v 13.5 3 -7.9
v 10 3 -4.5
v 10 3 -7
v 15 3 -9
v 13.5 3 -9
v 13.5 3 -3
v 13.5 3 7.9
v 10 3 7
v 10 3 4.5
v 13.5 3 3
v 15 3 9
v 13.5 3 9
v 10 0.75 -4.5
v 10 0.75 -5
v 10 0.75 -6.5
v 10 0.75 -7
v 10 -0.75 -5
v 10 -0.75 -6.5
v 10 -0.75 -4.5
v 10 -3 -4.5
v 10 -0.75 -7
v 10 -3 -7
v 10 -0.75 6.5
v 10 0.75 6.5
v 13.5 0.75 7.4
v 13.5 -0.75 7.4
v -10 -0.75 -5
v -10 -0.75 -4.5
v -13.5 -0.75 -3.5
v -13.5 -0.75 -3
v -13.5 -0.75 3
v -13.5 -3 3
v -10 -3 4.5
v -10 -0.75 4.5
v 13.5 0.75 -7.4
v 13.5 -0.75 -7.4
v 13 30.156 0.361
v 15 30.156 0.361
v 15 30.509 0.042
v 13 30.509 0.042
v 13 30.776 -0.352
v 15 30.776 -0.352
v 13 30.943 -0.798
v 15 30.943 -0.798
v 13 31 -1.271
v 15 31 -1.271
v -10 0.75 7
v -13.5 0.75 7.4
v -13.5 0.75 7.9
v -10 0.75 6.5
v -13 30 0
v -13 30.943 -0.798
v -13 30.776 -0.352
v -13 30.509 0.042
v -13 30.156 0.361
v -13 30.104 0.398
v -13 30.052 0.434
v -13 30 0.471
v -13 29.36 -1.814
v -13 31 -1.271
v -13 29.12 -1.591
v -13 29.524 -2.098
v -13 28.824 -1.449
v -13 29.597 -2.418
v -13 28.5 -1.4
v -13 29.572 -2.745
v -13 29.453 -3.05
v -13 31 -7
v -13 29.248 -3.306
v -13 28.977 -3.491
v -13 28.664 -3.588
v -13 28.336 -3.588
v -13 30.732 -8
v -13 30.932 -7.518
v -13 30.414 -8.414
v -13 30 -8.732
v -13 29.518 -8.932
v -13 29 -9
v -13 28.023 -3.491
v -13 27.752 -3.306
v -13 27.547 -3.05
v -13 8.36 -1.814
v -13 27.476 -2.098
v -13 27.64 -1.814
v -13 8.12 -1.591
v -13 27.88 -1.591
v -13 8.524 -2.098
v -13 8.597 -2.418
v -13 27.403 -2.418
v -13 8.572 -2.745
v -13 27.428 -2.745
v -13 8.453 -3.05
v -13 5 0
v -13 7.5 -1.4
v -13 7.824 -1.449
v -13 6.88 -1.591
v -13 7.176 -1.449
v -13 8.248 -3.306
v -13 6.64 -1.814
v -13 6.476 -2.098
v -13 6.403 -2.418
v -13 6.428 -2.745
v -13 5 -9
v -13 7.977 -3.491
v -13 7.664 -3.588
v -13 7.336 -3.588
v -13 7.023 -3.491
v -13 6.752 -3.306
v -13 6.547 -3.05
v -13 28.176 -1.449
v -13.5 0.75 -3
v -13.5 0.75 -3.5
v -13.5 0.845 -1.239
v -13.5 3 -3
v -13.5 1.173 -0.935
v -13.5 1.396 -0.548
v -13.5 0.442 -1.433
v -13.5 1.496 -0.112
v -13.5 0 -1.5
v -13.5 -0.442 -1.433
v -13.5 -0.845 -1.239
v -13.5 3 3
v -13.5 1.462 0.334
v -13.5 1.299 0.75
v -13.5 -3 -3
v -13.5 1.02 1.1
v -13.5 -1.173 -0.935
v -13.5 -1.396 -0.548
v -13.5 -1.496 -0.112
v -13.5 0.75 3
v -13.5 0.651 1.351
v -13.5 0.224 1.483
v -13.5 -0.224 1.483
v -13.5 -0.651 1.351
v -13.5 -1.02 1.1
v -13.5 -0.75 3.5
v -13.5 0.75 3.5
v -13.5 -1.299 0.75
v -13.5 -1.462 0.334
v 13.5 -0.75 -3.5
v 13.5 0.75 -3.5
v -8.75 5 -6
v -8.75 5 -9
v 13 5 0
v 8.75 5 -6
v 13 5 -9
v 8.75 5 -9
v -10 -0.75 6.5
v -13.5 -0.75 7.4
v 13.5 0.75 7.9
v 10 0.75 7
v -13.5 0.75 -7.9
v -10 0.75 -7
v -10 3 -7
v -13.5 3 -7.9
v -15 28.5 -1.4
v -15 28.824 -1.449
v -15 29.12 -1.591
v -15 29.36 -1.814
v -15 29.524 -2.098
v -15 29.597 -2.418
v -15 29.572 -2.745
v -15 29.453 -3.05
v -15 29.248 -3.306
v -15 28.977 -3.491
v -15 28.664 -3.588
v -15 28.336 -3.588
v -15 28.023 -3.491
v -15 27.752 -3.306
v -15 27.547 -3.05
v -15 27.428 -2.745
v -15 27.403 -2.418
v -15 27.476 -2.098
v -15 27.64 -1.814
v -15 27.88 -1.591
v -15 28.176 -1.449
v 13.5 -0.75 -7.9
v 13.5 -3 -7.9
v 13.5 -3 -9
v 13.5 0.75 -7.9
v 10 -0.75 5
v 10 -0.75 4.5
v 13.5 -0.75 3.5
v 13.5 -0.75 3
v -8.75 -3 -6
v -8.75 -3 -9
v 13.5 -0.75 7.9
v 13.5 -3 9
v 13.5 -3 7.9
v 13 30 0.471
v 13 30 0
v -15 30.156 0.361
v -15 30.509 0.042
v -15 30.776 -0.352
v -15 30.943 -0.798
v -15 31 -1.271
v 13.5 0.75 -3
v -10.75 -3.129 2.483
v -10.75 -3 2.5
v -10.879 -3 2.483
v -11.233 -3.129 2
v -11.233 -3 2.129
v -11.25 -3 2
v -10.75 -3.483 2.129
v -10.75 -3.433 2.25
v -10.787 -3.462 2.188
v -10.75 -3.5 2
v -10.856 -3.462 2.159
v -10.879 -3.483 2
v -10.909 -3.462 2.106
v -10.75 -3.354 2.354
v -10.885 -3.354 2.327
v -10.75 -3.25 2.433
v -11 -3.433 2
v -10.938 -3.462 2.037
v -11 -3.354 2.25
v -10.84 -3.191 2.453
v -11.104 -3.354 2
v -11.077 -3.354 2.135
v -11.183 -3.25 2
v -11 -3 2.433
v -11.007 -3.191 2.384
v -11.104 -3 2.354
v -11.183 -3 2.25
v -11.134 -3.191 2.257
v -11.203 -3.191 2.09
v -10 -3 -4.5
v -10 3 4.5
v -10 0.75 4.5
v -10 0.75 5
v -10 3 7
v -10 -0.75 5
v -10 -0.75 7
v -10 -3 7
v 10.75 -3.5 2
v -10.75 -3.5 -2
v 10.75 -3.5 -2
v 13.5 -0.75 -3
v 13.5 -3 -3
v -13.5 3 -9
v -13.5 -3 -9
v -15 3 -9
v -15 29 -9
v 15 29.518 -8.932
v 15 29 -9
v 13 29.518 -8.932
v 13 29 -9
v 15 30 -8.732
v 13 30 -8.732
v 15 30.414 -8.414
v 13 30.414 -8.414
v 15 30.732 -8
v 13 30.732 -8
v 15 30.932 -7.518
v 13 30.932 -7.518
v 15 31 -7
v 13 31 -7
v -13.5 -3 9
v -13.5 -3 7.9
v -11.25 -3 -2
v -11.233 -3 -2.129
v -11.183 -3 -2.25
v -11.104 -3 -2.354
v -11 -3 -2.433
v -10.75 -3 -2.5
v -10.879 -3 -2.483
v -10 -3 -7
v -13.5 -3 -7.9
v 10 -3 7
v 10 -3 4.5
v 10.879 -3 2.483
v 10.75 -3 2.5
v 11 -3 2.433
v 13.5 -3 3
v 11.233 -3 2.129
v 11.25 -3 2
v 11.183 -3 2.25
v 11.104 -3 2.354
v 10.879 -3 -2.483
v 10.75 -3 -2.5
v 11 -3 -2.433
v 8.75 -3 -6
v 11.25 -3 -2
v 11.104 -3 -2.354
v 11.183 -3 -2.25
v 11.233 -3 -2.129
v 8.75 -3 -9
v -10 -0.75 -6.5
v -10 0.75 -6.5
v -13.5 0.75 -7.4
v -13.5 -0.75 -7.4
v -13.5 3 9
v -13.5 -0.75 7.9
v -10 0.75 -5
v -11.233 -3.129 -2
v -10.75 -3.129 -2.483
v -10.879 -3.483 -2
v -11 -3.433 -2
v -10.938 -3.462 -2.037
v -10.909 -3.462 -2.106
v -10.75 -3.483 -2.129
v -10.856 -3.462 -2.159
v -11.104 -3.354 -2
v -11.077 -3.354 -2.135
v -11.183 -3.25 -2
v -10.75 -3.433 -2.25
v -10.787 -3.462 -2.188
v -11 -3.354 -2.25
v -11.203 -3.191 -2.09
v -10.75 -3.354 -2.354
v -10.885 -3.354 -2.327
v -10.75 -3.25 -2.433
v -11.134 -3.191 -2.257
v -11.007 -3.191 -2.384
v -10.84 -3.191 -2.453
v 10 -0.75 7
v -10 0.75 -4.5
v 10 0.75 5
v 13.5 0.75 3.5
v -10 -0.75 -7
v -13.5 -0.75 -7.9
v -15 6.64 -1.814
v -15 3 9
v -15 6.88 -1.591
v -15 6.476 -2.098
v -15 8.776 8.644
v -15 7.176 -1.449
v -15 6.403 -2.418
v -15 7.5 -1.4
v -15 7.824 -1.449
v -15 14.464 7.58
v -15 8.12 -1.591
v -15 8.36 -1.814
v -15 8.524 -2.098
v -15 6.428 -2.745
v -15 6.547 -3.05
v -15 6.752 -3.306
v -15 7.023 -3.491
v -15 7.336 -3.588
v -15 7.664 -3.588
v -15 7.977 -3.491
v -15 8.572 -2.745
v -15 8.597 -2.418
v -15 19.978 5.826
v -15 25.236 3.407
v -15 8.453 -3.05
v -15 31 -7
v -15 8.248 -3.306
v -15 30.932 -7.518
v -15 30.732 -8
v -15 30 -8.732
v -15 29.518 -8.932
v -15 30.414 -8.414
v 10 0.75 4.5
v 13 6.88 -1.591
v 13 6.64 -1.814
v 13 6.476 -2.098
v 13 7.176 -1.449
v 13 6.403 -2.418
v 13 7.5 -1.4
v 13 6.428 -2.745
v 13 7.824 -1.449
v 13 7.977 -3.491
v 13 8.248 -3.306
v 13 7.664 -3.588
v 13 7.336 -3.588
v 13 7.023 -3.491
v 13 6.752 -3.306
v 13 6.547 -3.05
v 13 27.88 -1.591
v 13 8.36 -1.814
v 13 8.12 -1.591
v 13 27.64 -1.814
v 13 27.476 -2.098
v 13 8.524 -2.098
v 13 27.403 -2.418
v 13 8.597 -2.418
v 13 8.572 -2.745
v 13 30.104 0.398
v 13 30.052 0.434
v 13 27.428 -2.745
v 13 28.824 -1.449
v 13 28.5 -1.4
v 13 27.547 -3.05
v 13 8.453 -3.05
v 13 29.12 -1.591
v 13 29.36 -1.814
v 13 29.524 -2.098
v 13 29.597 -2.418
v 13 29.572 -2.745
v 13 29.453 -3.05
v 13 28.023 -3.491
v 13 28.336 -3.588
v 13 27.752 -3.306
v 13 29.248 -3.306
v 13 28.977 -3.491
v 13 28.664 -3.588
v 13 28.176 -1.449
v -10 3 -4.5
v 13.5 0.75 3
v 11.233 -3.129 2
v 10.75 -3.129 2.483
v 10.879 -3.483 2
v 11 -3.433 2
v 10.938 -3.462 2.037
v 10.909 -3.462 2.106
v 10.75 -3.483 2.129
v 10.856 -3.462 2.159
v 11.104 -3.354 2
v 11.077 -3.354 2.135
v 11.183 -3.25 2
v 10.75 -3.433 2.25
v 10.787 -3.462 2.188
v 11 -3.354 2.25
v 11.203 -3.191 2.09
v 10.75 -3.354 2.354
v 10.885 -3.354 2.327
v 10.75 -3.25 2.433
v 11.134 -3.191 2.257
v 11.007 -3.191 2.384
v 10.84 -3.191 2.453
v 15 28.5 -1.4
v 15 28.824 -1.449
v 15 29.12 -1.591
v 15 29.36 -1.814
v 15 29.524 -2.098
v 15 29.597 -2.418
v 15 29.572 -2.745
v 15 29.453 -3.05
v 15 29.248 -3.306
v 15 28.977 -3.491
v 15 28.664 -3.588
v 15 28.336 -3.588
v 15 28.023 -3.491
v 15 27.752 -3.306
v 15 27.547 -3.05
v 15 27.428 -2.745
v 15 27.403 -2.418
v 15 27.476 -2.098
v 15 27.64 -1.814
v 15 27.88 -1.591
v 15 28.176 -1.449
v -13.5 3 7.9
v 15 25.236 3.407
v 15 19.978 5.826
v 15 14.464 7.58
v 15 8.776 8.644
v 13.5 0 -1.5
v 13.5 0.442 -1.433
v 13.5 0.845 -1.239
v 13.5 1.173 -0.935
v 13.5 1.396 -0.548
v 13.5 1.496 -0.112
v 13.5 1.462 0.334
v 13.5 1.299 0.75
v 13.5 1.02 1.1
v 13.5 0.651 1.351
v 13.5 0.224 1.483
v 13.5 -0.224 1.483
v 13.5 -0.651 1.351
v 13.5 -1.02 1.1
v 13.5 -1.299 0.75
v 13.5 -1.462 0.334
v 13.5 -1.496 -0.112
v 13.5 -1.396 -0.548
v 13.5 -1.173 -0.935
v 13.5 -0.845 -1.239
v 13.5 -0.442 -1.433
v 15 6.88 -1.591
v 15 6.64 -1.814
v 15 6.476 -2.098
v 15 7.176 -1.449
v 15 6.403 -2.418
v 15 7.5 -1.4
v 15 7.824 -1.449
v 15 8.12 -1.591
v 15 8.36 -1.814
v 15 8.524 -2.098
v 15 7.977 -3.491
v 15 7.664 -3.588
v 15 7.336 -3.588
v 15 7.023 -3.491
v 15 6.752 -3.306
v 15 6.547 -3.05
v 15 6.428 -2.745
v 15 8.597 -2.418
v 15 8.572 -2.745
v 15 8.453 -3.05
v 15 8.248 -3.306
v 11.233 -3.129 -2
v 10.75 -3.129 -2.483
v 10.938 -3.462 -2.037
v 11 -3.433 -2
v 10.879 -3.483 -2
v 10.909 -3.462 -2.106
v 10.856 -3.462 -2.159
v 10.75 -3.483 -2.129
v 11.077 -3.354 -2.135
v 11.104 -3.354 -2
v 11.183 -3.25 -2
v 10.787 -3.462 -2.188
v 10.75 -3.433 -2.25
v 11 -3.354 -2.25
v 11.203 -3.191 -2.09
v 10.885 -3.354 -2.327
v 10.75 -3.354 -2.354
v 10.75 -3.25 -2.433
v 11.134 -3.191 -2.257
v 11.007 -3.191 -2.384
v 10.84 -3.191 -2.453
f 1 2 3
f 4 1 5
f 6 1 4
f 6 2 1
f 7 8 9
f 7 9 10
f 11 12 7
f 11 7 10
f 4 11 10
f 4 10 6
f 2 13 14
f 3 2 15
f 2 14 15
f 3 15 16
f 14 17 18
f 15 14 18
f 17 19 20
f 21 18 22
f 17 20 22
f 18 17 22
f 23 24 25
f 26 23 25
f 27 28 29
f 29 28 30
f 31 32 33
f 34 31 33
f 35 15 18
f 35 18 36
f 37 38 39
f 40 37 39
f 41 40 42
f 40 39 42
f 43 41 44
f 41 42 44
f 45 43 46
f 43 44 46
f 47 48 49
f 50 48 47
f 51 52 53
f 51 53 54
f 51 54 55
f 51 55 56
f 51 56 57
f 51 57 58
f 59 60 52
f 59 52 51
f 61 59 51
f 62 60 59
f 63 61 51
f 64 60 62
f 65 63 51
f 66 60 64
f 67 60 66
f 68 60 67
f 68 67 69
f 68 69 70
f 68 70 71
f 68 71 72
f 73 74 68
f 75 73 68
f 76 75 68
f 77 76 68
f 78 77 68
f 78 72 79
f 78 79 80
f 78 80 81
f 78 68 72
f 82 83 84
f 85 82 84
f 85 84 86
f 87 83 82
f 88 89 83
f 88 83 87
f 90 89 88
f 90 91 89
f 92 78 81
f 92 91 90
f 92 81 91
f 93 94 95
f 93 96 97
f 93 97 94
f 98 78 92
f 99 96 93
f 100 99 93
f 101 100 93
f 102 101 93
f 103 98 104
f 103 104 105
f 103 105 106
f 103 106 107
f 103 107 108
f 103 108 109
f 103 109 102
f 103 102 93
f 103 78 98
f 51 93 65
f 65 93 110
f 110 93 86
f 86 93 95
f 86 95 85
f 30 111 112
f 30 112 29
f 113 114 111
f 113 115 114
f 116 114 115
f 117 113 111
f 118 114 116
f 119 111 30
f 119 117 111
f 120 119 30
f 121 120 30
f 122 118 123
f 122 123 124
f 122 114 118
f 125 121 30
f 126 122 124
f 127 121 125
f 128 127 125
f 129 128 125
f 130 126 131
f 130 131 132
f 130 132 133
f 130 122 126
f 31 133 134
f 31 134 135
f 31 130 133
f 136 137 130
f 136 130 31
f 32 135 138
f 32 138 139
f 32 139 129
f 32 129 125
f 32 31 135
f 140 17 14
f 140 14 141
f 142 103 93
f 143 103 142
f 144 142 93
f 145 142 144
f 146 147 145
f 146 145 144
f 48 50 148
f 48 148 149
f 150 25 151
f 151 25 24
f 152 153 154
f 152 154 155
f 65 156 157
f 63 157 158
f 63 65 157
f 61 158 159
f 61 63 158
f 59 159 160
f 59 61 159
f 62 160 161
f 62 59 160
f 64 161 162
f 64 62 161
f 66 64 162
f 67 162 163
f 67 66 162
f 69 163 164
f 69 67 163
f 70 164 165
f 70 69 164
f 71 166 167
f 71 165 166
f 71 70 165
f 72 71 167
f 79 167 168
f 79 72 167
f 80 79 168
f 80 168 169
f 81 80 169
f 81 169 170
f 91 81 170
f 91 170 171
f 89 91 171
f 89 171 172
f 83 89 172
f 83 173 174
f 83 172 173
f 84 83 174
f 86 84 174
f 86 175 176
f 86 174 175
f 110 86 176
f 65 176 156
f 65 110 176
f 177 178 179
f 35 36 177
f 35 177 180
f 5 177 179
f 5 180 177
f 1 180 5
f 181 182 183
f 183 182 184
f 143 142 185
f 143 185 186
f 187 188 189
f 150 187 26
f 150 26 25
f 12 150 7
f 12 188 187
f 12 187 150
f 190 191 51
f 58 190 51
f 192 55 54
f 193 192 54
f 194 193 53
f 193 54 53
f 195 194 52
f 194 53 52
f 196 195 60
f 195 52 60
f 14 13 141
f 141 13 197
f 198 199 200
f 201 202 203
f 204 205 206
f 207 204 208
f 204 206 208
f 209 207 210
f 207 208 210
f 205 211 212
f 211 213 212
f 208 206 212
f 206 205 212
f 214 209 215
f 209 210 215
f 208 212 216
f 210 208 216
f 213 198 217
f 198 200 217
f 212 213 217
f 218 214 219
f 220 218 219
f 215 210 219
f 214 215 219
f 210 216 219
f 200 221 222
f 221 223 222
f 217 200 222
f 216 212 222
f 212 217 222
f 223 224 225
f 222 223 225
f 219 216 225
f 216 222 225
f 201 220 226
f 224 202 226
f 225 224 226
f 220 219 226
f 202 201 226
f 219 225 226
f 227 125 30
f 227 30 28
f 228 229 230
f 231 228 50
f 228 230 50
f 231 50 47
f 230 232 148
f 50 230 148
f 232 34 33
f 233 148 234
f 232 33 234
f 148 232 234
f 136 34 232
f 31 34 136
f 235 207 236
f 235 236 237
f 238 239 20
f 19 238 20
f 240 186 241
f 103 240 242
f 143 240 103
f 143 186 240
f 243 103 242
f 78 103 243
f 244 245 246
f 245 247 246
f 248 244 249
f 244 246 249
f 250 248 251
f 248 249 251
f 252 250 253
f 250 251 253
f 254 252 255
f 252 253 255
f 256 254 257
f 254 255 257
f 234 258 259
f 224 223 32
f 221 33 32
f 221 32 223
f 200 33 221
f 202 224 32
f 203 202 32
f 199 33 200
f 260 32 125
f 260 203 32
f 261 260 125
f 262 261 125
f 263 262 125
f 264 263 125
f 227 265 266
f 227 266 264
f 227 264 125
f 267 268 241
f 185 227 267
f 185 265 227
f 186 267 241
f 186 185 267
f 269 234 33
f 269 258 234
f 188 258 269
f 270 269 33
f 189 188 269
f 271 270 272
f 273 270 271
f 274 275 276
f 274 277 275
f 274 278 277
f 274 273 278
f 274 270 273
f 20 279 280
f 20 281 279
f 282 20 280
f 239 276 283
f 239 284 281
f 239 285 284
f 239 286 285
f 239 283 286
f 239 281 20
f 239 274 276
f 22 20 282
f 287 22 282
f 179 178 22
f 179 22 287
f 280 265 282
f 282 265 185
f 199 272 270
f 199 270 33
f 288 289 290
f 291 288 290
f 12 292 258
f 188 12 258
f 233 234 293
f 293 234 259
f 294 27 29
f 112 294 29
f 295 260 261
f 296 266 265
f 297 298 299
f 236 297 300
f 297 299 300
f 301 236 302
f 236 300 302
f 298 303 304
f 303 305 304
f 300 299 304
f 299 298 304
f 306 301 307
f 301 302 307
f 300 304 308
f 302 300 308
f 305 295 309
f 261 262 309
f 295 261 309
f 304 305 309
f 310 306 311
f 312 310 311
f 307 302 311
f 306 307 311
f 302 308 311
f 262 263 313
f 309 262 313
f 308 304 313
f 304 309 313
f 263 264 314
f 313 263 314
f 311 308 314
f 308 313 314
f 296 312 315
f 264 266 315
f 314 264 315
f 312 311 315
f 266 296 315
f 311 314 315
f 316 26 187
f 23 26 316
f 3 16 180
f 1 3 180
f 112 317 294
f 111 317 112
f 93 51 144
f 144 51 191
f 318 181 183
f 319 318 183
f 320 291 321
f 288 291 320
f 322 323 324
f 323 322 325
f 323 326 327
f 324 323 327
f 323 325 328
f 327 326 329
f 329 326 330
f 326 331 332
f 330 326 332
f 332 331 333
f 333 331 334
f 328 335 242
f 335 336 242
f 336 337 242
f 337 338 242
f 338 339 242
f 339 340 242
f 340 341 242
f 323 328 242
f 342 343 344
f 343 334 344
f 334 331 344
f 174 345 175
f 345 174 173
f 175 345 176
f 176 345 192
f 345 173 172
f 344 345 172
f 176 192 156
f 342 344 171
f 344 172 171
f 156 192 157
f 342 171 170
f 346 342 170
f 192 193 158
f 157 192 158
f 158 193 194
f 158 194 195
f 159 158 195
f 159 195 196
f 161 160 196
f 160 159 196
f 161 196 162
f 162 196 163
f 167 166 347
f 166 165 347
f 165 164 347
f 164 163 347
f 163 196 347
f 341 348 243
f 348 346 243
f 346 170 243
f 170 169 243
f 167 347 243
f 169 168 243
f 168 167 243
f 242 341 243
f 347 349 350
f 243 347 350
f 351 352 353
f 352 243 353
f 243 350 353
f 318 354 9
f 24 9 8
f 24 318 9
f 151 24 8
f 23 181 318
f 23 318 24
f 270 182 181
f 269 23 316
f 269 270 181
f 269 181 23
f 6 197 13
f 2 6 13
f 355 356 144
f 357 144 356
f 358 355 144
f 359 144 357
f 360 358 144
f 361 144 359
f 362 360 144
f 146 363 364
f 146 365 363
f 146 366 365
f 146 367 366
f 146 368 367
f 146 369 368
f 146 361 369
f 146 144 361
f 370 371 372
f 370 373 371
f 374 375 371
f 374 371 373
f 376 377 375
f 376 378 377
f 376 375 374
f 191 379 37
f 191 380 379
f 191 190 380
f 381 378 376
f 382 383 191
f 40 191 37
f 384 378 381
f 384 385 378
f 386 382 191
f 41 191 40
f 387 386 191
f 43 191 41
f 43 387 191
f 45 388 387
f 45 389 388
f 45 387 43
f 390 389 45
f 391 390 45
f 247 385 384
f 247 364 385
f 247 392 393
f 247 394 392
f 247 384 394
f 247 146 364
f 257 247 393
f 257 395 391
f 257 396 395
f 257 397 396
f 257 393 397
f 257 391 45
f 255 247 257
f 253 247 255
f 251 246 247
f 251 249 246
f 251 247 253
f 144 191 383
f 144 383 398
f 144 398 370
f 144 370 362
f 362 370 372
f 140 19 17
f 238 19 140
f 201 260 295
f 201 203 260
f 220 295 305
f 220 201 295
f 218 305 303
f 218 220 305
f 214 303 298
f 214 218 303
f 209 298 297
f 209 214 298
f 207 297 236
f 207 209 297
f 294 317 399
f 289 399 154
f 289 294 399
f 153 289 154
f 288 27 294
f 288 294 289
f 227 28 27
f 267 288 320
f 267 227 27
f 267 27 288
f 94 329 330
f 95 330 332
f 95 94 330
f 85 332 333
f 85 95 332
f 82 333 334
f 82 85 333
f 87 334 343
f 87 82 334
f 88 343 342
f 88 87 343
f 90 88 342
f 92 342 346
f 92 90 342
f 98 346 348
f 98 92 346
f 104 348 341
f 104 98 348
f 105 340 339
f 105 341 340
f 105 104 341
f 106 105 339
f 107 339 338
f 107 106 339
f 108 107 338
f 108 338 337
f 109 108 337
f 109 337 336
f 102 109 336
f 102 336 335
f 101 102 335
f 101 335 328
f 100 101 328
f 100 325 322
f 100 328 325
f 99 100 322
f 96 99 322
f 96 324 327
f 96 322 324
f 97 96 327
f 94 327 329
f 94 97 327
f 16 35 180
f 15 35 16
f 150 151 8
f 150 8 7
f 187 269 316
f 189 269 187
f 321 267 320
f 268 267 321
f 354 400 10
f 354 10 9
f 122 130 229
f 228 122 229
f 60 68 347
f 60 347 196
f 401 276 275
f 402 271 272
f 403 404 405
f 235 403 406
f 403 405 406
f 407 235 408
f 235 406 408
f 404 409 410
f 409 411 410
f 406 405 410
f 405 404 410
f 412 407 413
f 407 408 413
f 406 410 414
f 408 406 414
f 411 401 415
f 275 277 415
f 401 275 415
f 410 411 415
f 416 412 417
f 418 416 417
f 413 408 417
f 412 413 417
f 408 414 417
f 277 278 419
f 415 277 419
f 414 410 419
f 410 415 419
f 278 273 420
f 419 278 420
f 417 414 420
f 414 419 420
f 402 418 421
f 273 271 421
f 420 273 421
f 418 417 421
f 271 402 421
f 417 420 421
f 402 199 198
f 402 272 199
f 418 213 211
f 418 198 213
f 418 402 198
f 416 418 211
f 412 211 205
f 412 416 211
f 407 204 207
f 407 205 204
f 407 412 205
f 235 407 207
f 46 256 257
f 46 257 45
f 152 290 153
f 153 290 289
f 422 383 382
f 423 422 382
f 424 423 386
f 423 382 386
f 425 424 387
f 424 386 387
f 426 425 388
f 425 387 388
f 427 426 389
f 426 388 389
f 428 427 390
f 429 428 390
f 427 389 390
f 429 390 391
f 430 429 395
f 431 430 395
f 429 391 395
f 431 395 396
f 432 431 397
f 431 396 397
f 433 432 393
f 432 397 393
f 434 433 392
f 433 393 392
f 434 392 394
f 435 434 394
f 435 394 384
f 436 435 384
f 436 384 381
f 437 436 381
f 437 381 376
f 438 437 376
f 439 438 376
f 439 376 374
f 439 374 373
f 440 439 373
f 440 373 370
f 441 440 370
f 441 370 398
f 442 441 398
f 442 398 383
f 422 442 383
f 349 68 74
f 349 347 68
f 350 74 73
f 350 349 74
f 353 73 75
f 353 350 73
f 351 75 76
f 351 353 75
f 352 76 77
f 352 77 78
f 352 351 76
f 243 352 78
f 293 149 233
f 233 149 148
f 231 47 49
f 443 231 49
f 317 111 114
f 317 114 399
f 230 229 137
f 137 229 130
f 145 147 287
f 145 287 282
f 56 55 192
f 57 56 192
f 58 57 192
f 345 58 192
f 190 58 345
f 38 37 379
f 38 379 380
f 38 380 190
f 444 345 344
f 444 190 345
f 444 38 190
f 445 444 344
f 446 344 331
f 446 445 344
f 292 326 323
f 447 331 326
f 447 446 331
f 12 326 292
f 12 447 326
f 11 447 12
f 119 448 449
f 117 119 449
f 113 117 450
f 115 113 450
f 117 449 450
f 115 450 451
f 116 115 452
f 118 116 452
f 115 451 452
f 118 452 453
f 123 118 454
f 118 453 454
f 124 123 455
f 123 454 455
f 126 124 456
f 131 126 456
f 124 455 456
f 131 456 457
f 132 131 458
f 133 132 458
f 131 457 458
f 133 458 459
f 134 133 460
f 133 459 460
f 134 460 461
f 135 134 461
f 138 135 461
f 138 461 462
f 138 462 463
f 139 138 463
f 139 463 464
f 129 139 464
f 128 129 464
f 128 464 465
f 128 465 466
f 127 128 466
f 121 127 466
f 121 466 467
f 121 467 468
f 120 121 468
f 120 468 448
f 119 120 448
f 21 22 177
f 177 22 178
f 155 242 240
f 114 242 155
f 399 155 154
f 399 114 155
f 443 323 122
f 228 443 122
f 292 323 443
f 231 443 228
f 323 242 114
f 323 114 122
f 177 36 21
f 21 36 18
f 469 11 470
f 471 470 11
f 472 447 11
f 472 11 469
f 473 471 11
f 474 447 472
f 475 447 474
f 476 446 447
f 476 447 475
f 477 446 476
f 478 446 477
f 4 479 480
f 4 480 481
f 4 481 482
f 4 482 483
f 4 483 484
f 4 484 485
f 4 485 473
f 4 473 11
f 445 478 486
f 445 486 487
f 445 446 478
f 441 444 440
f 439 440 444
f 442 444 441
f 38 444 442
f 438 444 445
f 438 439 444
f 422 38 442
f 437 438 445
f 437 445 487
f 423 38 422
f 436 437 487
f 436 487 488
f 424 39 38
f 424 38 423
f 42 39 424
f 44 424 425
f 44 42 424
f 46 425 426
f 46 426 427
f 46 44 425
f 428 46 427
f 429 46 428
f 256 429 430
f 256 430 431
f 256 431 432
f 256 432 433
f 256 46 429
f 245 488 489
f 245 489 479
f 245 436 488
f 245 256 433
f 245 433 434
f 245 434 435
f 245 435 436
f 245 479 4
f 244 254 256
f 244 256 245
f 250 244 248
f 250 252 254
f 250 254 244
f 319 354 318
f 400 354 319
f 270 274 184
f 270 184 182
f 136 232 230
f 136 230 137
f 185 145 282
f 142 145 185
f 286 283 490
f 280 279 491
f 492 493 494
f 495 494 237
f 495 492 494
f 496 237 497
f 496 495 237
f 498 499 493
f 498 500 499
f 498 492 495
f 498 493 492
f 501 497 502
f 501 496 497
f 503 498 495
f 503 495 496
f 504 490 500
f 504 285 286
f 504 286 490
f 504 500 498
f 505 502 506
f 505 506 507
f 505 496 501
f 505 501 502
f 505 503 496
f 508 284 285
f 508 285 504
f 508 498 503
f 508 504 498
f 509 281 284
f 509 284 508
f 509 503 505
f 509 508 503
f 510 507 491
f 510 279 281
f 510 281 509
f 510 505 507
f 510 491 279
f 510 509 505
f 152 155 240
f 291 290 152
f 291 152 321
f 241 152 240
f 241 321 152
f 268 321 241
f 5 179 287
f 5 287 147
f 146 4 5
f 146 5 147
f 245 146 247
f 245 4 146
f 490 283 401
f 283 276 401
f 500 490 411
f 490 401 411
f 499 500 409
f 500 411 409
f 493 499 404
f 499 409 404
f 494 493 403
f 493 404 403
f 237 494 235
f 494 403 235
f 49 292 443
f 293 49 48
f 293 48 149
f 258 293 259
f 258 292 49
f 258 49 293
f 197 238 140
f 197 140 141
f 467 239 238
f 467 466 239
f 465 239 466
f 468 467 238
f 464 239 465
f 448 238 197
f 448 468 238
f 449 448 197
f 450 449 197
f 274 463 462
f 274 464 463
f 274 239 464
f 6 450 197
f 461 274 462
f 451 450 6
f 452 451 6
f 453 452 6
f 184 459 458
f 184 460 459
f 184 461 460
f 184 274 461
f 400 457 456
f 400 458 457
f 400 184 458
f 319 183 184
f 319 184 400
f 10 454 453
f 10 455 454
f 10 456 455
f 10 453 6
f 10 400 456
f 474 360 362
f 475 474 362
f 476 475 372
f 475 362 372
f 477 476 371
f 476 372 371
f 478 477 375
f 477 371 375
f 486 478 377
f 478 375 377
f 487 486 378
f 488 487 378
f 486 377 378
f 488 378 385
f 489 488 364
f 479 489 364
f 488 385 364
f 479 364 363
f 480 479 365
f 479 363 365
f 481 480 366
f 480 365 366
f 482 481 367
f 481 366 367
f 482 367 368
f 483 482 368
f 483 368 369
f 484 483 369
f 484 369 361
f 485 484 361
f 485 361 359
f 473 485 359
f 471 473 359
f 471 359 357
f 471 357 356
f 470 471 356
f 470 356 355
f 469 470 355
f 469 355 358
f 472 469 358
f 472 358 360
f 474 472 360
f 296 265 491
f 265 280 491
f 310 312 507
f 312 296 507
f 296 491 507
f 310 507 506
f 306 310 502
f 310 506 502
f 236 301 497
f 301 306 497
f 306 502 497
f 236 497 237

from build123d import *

# Parameters (mm, degrees)
EXTRUDE_1_DEPTH             = 15
CUT_EXTRUDE_1_DEPTH         = 9
FILLET_1_R                  = 2
CUT_EXTRUDE_2_REACH         = 33.337
SKETCH_4_R                  = 1.5000000000000007
CUT_EXTRUDE_3_DEPTH         = 45.068129073061414
SKETCH_6_W                  = 1.5
SKETCH_6_H                  = 6
CUT_EXTRUDE_5_DEPTH         = 39.8587184554509
CUT_EXTRUDE_4_DEPTH         = 6
SKETCH_7_W                  = 22.5
SKETCH_7_H                  = 5
EXTRUDE_2_DEPTH             = 0.5
FILLET_2_R                  = 0.5
HOLE_WIZARD_2_2_2_2_1_D     = 2.2
HOLE_WIZARD_2_2_2_2_1_DEPTH = 2
MIRROR_2_COPY_1_DEPTH       = 6
SKETCH_10_W                 = 26.000000000000004
SKETCH_10_H                 = 2.9999999999999964
CUT_EXTRUDE_6_DEPTH         = 36.59494346111538
EXTRUDE_3_DEPTH             = 0.75
MIRROR_4_COPY_1_DEPTH       = 0.75


with BuildPart() as part:
    # ｽｹｯﾁ1 → ﾎﾞｽ - 押し出し1 (new, symmetric)
    with BuildSketch(Plane(origin=(0, 0, 0), x_dir=(0, 0, -1), z_dir=(1, 0, 0))):
        with BuildLine():
            Line((8.999999999999996, 31.000000000000004), (0.2508278236462402, 31))
            ThreePointArc((0.2508278236462402, 31), (-6.627408015078736, 17.74430242011084), (-9, 3))
            Line((-9, 3), (-9, -3))
            Line((-9, -3), (9, -2.999999999999999))
            Line((9, -2.999999999999999), (8.999999999999996, 31.000000000000004))
        make_face()
    extrude(amount=EXTRUDE_1_DEPTH, both=True)

    # ｽｹｯﾁ2 → ｶｯﾄ - 押し出し1 (cut)
    with BuildSketch(Plane(origin=(0, 9.2e-16, -9), x_dir=(-1, 0, 0), z_dir=(0, 1e-16, -1))):
        Polygon((-13, 31.000000000000004), (13, 31.000000000000004), (13.000000000000002, 5), (-12.999999999999996, 5), align=None)
    extrude(amount=-CUT_EXTRUDE_1_DEPTH, mode=Mode.SUBTRACT)

    # ﾌｨﾚｯﾄ1
    fillet_1_edges = [part.edges().sort_by_distance(p)[0] for p in [
        (-14, 31.000000000000004, -8.999999999999996),
    ]]
    fillet(fillet_1_edges, radius=FILLET_1_R)
    fillet_1_2_edges = [part.edges().sort_by_distance(p)[0] for p in [
        (14, 31.000000000000004, -8.999999999999996),
    ]]
    fillet(fillet_1_2_edges, radius=FILLET_1_R)
    fillet_1_3_edges = [part.edges().sort_by_distance(p)[0] for p in [
        (-14, 31, -0.2508278236462367),
    ]]
    fillet(fillet_1_3_edges, radius=FILLET_1_R)

    # ｽｹｯﾁ3 → ｶｯﾄ - 押し出し2 (cut, up to next)
    with BuildSketch(Plane(origin=(0, 5, 5.1e-16), x_dir=(1, 0, 0), z_dir=(0, 1, 1e-16)), mode=Mode.PRIVATE) as cut_extrude_2_sk1:
        Polygon((-8.749999999999998, 9), (8.750000000000002, 9), (8.750000000000004, 5.999999999999999), (-8.749999999999998, 5.999999999999999), align=None)
    cut_extrude_2_tool1 = extrude(cut_extrude_2_sk1.sketch, amount=-CUT_EXTRUDE_2_REACH, mode=Mode.PRIVATE) & part.part
    add(cut_extrude_2_tool1.solids().sort_by_distance((0, 5, -7.5))[0], mode=Mode.SUBTRACT)

    # ｽｹｯﾁ4 → ｶｯﾄ - 押し出し3 (cut, through all)
    with BuildSketch(Plane(origin=(15, 0, 0), x_dir=(0, 0, -1), z_dir=(1, 0, 0))):
        Circle(SKETCH_4_R)
    extrude(amount=-CUT_EXTRUDE_3_DEPTH, mode=Mode.SUBTRACT)

    # ｽｹｯﾁ6 → ｶｯﾄ - 押し出し5 (cut, through all)
    with BuildSketch(Plane.XY.offset(9)):
        Polygon((-15, 3), (-13.5, 3), (-13.499999999999998, -3), (-15, -3), align=None)
        with Locations((14.250000000000002, 0)):
            Rectangle(SKETCH_6_W, SKETCH_6_H)
    extrude(amount=-CUT_EXTRUDE_5_DEPTH, mode=Mode.SUBTRACT)

    # ｽｹｯﾁ5 → ｶｯﾄ - 押し出し4 (cut)
    with BuildSketch(Plane.XZ.offset(2.9999999999999996)):
        Polygon((13.5, -3), (10, -4.500000000000001), (10, -7), (13.5, -7.9), align=None)
    cut_extrude_4 = extrude(amount=-CUT_EXTRUDE_4_DEPTH, mode=Mode.SUBTRACT)

    # ﾐﾗｰ1: ｶｯﾄ - 押し出し4 across plane
    add(cut_extrude_4.mirror(Plane.XY), mode=Mode.SUBTRACT)

    # ｽｹｯﾁ7 → ﾎﾞｽ - 押し出し2 (add)
    with BuildSketch(Plane.XZ.offset(2.9999999999999996)):
        Rectangle(SKETCH_7_W, SKETCH_7_H)
    extrude(amount=EXTRUDE_2_DEPTH)

    # ﾌｨﾚｯﾄ2
    fillet_2_edges = [part.edges().sort_by_distance(p)[0] for p in [
        (11.250000000000004, -3.2499999999999996, -2.5000000000000004),
        (11.250000000000004, -3.2499999999999996, 2.4999999999999996),
        (-11.249999999999996, -3.2499999999999996, 2.4999999999999996),
        (-11.249999999999996, -3.2499999999999996, -2.5000000000000004),
        (11.250000000000004, -3.4999999999999996, -6.1e-16),
        (3.55e-15, -3.4999999999999996, 2.4999999999999996),
        (-11.249999999999996, -3.4999999999999996, -6.1e-16),
        (3.55e-15, -3.4999999999999996, -2.5000000000000004),
    ]]
    fillet(fillet_2_edges, radius=FILLET_2_R - 0.0001)  # a hair under: the kernel refuses the full size

    # Ø2.2 (2.2) 直径の穴1
    with Locations(Plane(origin=(15, 0, 0), x_dir=(0, 0, -1), z_dir=(1, 0, 0))):
        with Locations((2.5, 28.5), (2.5, 7.5)):
            hole_wizard_2_2_2_2_1 = Hole(HOLE_WIZARD_2_2_2_2_1_D / 2, depth=HOLE_WIZARD_2_2_2_2_1_DEPTH)

    # ﾐﾗｰ2: ｶｯﾄ - 押し出し4, Ø2.2 (2.2) 直径の穴1 across plane
    add(cut_extrude_4.mirror(Plane(origin=(0, 0, 0), x_dir=(0, 0, 1), z_dir=(1, 0, 0))), mode=Mode.SUBTRACT)
    add(hole_wizard_2_2_2_2_1.mirror(Plane(origin=(0, 0, 0), x_dir=(0, 0, 1), z_dir=(1, 0, 0))), mode=Mode.SUBTRACT)

    # ﾐﾗｰ2 copy 1 sketch → ﾐﾗｰ2 copy 1 (cut)
    with BuildSketch(Plane(origin=(0, -2.9999999999999996, 1.4e-16), x_dir=(-1, 0, 0), z_dir=(0, -1, 5e-17))):
        Polygon((13.5, -3), (10, -4.500000000000001), (10, -7), (13.5, -7.9), align=None)
    extrude(amount=-MIRROR_2_COPY_1_DEPTH, mode=Mode.SUBTRACT)

    # ｽｹｯﾁ10 → ｶｯﾄ - 押し出し6 (cut, through all)
    with BuildSketch(Plane(origin=(0, 0, 0), x_dir=(-1, 0, 0), z_dir=(0, 1.3e-16, -1))):
        with Locations((0, 31.5)):
            Rectangle(SKETCH_10_W, SKETCH_10_H)
    extrude(amount=-CUT_EXTRUDE_6_DEPTH, mode=Mode.SUBTRACT)

    # ｽｹｯﾁ12 → ﾎﾞｽ - 押し出し3 (add, symmetric)
    with BuildSketch(Plane(origin=(0, 0, 0), x_dir=(-1, 0, 0), z_dir=(0, -1, -2e-17))):
        Polygon((13.5, -7.9), (9.999999999999998, -7), (10, -6.500000000000001), (13.5, -7.4), align=None)
        Polygon((10, -4.500000000000001), (10, -5), (13.499999999999998, -3.4999999999999982), (13.5, -2.9999999999999996), align=None)
    extrude_3 = extrude(amount=EXTRUDE_3_DEPTH, both=True)

    # ﾐﾗｰ3: ﾎﾞｽ - 押し出し3 across plane
    add(extrude_3.mirror(Plane.XY))

    # ﾐﾗｰ4: ﾎﾞｽ - 押し出し3 across plane
    add(extrude_3.mirror(Plane(origin=(0, 0, 0), x_dir=(0, 0, 1), z_dir=(1, 0, 0))))

    # ﾐﾗｰ4 copy 1 sketch → ﾐﾗｰ4 copy 1 (add, symmetric)
    with BuildSketch(Plane.XZ):
        Polygon((13.5, -7.9), (9.999999999999998, -7), (10, -6.500000000000001), (13.5, -7.4), align=None)
        Polygon((10, -4.500000000000001), (10, -5), (13.499999999999998, -3.4999999999999982), (13.5, -2.9999999999999996), align=None)
    extrude(amount=MIRROR_4_COPY_1_DEPTH, both=True)


solid = part.part
